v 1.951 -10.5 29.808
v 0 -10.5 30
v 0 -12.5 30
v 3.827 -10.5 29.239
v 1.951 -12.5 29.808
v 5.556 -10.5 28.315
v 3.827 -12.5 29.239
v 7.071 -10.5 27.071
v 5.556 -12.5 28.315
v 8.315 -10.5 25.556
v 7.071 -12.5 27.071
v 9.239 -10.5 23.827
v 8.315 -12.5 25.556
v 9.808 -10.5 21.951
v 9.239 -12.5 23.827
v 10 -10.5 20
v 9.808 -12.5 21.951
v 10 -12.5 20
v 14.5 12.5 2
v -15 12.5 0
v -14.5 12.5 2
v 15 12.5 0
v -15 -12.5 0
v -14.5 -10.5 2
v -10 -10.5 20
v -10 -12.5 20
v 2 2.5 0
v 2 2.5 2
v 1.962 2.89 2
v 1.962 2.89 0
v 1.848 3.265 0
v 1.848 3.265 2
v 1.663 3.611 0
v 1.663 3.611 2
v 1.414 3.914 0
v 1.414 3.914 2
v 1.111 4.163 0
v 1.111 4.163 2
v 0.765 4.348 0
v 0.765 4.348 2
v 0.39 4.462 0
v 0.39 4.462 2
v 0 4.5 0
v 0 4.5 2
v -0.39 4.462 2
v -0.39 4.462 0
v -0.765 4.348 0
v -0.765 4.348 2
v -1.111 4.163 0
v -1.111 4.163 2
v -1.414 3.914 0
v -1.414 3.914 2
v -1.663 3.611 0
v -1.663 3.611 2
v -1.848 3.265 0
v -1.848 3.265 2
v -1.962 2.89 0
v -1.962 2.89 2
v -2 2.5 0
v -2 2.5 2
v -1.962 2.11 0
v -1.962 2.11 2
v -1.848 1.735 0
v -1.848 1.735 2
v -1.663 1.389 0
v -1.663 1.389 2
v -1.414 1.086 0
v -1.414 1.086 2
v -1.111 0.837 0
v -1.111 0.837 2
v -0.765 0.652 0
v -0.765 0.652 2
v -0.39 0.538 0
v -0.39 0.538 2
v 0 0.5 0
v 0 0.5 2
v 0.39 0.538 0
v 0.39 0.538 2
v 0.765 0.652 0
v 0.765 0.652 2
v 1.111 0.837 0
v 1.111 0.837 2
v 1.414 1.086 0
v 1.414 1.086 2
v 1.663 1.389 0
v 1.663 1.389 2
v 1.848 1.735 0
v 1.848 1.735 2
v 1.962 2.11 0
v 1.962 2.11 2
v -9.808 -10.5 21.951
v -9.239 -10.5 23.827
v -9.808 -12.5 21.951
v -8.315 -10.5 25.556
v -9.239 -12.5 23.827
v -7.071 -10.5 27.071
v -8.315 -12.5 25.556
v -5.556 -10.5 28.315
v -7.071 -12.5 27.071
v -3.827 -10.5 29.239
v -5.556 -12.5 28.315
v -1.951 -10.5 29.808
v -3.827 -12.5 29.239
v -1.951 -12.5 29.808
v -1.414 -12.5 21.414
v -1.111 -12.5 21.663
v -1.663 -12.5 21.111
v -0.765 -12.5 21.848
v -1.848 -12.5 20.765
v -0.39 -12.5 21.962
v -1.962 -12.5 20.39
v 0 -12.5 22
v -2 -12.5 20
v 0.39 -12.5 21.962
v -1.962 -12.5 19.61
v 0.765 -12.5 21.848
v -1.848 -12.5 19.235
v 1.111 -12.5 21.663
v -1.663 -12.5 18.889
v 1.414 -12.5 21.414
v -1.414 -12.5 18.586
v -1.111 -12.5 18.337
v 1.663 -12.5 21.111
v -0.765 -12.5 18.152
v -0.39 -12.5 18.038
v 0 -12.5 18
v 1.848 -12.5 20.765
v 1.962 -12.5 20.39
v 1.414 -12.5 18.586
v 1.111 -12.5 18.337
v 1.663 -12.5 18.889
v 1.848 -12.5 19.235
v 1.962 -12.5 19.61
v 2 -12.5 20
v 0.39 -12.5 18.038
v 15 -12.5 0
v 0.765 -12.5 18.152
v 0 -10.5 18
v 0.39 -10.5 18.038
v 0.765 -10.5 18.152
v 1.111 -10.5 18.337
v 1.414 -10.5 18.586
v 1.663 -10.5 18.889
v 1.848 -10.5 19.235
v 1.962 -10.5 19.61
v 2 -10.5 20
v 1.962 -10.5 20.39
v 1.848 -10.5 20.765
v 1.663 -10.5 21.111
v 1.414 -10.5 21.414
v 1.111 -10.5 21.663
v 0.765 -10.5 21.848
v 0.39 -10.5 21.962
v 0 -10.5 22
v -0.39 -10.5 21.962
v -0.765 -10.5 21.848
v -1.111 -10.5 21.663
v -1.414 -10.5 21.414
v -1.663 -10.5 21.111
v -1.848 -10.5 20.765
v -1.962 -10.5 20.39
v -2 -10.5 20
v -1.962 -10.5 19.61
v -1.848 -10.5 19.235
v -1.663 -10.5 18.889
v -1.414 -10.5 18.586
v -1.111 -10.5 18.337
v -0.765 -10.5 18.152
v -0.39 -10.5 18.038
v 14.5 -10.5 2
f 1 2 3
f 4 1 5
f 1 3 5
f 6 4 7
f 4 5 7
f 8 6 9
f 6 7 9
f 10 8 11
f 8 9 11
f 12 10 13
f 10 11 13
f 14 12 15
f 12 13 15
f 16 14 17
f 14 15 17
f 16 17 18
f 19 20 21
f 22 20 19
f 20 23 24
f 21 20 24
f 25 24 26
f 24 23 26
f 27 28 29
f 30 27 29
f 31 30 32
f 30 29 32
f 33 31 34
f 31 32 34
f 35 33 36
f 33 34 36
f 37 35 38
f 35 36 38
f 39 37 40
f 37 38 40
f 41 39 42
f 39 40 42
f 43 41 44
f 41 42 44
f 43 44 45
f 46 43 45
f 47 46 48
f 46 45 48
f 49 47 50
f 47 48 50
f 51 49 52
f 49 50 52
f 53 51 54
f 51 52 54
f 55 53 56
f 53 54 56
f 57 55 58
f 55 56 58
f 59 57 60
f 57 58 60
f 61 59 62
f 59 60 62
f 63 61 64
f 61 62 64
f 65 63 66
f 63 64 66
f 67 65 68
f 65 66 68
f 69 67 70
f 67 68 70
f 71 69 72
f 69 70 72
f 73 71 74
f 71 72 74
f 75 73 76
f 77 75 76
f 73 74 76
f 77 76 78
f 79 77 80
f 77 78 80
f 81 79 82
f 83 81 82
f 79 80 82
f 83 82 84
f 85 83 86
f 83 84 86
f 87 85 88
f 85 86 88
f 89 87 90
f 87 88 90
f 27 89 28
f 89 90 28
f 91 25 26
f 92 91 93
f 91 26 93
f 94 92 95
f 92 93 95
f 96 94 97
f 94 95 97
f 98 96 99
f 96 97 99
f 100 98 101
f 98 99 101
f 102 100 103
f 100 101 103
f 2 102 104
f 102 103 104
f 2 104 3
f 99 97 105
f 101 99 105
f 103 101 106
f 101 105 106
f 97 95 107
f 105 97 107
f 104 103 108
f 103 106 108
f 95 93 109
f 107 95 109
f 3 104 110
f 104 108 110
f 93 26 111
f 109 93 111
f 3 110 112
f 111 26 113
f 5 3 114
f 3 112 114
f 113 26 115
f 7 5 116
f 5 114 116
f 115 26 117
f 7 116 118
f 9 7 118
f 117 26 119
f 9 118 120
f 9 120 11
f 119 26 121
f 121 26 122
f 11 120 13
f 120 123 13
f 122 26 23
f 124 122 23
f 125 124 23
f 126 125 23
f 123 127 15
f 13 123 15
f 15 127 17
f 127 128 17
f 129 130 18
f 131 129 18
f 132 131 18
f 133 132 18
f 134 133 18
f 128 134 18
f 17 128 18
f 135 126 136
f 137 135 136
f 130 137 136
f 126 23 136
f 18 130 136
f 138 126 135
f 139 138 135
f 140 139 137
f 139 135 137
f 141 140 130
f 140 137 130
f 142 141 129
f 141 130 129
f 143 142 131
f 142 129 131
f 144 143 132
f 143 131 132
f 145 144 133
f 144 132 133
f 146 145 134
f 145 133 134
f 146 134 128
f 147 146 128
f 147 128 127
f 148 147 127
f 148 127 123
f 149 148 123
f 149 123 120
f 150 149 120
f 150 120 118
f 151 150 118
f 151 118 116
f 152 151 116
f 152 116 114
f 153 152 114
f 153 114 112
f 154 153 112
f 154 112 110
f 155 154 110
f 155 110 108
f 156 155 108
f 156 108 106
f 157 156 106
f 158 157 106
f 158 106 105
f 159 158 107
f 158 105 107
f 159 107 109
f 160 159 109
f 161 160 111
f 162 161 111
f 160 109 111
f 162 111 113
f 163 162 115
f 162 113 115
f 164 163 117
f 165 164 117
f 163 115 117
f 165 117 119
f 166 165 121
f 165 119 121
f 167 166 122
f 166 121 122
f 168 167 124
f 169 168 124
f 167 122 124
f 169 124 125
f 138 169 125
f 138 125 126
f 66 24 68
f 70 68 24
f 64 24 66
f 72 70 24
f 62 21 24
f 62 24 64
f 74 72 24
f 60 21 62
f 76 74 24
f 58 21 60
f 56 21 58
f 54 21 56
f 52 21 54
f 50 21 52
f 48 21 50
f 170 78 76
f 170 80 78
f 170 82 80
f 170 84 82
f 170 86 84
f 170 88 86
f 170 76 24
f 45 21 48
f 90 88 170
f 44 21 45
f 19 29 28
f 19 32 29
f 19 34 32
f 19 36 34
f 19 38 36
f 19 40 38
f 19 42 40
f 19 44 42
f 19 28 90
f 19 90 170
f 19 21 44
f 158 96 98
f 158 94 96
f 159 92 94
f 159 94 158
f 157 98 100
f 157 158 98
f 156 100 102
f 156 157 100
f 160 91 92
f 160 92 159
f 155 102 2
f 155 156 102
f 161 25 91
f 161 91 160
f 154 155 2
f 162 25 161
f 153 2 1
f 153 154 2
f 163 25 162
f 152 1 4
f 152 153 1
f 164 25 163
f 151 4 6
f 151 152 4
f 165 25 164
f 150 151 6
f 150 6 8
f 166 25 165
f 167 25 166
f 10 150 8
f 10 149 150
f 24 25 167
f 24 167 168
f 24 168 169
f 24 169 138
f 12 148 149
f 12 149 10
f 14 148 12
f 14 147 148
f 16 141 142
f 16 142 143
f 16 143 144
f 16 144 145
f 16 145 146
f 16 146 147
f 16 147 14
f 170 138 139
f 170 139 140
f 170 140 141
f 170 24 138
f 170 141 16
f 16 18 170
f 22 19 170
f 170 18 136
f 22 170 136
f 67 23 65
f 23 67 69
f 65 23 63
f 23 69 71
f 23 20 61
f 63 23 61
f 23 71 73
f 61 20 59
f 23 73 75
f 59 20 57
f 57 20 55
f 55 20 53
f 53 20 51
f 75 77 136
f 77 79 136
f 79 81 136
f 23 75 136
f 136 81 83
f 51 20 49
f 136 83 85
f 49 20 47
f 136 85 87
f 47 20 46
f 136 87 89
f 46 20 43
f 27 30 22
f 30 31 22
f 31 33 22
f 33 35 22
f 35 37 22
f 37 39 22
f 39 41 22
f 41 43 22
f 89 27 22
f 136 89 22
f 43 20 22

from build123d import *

# Parameters (mm, degrees)
SKETCH1_W           = 30
SKETCH1_H           = 25
BOSS_EXTRUDE1_DEPTH = 2
SKETCH2_R           = 2
CUT_EXTRUDE1_DEPTH  = 2
SKETCH3_W           = 30
SKETCH3_H           = 2
BOSS_EXTRUDE3_DEPTH = 28
SKETCH4_R           = 2
CUT_EXTRUDE2_DEPTH  = 42.833001327


with BuildPart() as part:
    # Sketch1 → Boss-Extrude1 (new body)
    with BuildSketch(Plane.XY):
        Rectangle(SKETCH1_W, SKETCH1_H)
    extrude(amount=BOSS_EXTRUDE1_DEPTH)

    # Sketch2 → Cut-Extrude1 (cut)
    with BuildSketch(Plane.XY.offset(2)):
        with Locations((0, 2.5)):
            Circle(SKETCH2_R)
    extrude(amount=-CUT_EXTRUDE1_DEPTH, mode=Mode.SUBTRACT)

    # Sketch3 → Boss-Extrude3 (add)
    with BuildSketch(Plane.XY.offset(2)):
        with Locations((0, -11.5)):
            Rectangle(SKETCH3_W, SKETCH3_H)
    extrude(amount=BOSS_EXTRUDE3_DEPTH)

    # Sketch4 → Cut-Extrude2 (cut, through all)
    with BuildSketch(Plane.XZ.offset(12.5)):
        with Locations(Location((0, 20, 0), (0, 0, 270))):
            Circle(SKETCH4_R)
        with BuildLine():
            Line((-15, 30), (-15, 0))
            Line((-15, 0), (-10, 20))
            ThreePointArc((-10, 20), (-7.071067812, 27.071067812), (0, 30))
            Line((0, 30), (-15, 30))
        make_face()
        with BuildLine():
            Line((15, 30), (0, 30))
            ThreePointArc((0, 30), (7.071067812, 27.071067812), (10, 20))
            Line((10, 20), (15, 0))
            Line((15, 0), (15, 30))
        make_face()
    extrude(amount=-CUT_EXTRUDE2_DEPTH, mode=Mode.SUBTRACT)


solid = part.part
